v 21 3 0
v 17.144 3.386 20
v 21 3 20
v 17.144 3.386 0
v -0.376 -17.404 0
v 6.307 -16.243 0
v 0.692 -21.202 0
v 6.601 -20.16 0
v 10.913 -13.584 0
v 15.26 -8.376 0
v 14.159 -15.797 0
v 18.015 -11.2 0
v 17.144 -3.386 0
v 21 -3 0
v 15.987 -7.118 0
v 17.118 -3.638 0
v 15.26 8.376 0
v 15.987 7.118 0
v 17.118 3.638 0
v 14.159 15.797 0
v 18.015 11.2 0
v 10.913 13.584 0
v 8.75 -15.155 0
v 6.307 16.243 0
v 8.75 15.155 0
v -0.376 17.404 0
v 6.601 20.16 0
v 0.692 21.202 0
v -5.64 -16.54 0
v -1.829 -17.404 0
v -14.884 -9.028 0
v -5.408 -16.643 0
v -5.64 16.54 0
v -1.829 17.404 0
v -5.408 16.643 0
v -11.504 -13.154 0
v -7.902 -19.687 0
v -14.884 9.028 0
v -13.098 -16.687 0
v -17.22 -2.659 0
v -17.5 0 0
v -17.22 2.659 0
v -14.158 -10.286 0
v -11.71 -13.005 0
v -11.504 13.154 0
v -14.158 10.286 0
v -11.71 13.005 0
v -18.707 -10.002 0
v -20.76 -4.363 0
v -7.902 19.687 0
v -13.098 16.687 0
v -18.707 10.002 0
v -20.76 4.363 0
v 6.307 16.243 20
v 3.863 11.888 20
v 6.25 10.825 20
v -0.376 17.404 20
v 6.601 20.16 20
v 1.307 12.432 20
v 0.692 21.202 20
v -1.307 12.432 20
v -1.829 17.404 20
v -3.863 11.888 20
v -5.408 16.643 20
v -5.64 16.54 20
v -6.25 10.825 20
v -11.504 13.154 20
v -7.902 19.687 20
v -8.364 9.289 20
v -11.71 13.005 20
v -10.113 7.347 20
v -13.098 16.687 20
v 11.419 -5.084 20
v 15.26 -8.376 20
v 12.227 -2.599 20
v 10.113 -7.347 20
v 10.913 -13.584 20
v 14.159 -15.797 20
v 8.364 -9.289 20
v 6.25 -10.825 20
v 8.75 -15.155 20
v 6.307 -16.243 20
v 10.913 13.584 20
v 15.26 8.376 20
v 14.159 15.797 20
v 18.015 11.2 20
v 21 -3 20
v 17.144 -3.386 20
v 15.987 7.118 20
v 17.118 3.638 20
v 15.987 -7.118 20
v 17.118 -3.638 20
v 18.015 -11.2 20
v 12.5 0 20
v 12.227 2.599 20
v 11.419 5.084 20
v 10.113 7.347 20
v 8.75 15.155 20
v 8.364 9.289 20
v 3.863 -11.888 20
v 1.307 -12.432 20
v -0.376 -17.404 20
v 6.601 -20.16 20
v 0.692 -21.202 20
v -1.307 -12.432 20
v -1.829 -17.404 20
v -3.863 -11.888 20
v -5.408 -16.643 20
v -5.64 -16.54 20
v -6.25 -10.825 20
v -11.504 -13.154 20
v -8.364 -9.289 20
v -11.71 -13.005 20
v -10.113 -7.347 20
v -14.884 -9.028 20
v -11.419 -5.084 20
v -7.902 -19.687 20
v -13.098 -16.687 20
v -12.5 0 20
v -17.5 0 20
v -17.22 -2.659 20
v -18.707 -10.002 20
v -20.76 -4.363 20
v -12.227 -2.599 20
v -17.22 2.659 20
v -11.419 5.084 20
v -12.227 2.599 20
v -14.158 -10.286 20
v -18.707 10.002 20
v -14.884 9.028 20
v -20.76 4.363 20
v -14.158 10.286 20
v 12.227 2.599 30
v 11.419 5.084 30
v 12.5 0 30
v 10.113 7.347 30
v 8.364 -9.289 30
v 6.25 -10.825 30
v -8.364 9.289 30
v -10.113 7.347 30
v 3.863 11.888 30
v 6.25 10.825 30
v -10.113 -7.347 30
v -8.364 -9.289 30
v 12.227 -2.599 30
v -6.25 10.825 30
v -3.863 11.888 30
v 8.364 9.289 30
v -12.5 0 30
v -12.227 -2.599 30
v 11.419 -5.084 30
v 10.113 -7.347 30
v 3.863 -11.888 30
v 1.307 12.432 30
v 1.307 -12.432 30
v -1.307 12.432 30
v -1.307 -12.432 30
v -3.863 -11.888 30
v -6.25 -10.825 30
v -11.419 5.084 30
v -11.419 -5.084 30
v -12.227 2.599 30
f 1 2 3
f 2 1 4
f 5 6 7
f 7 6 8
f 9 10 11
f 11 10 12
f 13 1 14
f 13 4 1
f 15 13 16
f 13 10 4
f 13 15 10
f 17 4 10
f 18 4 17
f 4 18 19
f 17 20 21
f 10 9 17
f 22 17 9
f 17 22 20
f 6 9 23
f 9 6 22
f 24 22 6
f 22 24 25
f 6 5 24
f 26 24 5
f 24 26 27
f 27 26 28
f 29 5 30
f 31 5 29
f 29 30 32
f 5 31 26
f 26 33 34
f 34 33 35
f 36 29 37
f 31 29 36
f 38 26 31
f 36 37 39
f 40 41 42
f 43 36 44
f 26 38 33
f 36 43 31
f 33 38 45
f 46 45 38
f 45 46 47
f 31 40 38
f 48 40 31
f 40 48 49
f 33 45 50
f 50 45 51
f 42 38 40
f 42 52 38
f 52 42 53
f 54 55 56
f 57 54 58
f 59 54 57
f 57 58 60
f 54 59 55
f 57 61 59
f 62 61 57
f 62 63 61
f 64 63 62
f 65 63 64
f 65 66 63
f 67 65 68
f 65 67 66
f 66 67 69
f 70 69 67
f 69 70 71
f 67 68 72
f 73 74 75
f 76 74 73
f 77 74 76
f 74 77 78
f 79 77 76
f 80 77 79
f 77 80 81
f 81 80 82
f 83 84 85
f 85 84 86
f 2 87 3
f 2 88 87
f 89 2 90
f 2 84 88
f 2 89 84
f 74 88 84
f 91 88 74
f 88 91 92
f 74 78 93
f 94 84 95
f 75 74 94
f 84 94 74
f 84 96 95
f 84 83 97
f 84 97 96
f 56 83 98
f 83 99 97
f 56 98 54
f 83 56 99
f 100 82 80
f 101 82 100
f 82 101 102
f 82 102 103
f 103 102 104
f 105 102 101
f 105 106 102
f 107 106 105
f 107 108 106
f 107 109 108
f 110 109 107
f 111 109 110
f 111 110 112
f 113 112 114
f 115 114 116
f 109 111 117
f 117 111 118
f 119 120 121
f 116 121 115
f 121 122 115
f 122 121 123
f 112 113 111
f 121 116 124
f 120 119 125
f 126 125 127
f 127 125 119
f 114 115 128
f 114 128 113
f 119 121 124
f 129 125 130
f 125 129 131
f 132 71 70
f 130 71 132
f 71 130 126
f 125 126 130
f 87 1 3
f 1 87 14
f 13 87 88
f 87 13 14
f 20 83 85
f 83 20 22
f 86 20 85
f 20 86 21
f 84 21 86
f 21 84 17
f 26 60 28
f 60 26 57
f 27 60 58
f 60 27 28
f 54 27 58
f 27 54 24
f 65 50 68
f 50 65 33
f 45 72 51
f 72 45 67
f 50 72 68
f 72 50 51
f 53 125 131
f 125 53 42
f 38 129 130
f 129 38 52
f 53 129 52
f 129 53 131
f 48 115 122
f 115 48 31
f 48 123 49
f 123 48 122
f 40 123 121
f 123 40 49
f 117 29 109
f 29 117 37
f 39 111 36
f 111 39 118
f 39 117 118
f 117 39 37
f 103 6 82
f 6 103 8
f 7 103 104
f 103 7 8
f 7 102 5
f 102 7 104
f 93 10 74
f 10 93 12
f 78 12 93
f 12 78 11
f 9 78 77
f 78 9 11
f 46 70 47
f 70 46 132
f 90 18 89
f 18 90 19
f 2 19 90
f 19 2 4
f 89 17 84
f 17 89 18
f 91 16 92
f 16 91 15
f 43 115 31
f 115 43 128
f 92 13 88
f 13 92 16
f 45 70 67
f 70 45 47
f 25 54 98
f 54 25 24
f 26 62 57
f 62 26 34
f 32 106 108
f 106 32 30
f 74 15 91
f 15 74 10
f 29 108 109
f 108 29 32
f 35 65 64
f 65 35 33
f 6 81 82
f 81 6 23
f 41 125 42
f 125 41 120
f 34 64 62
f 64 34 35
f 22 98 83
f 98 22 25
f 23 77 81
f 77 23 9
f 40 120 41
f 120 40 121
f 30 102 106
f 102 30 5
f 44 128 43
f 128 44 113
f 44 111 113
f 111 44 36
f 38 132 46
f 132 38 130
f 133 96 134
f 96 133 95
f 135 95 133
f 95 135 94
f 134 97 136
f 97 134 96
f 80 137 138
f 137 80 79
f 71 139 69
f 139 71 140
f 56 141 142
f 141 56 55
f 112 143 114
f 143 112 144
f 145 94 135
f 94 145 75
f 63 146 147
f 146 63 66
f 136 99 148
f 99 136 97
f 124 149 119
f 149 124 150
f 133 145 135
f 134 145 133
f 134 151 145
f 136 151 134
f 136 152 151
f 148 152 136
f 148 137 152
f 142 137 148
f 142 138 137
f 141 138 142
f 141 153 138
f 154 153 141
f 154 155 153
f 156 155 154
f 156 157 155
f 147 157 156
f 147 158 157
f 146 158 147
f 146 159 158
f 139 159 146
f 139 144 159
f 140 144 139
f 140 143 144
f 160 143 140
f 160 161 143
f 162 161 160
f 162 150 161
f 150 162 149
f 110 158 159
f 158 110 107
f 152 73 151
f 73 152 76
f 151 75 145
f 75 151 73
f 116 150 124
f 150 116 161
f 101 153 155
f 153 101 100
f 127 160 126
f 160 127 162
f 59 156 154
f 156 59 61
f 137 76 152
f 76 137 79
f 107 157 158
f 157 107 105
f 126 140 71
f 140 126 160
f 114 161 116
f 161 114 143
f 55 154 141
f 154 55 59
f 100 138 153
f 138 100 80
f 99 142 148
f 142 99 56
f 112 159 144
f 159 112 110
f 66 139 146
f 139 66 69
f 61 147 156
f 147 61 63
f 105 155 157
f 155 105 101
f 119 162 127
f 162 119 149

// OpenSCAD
//outer diameter
od = 35;

//tooth height
th = 5;

//tooth inner width
tiw = 6;

//tooth outer width
tow = 7;

//pulley thickness
pth = 20;

module tooth()
{
linear_extrude(height=pth)
rotate(-90)
translate([-tow/2,-tiw/2,0])
polygon(points=[[0,0], [tow, 0], [(tow-tiw)/2, th], [tow-(tow-tiw)/2, th]], paths=[[0,1,3,2]]);
}

tooth();

module pulley()
{
ang = 40;
cylinder(d=od, h=pth);

cylinder(d=od-10, h=pth+10);

for(i=[0:8])
{
translate([(.5*od+th/2-1)*cos(ang*i), (.5*od + th/2-1)*sin(ang*i),0])
rotate(ang*i)
tooth();
}

}

pulley();
